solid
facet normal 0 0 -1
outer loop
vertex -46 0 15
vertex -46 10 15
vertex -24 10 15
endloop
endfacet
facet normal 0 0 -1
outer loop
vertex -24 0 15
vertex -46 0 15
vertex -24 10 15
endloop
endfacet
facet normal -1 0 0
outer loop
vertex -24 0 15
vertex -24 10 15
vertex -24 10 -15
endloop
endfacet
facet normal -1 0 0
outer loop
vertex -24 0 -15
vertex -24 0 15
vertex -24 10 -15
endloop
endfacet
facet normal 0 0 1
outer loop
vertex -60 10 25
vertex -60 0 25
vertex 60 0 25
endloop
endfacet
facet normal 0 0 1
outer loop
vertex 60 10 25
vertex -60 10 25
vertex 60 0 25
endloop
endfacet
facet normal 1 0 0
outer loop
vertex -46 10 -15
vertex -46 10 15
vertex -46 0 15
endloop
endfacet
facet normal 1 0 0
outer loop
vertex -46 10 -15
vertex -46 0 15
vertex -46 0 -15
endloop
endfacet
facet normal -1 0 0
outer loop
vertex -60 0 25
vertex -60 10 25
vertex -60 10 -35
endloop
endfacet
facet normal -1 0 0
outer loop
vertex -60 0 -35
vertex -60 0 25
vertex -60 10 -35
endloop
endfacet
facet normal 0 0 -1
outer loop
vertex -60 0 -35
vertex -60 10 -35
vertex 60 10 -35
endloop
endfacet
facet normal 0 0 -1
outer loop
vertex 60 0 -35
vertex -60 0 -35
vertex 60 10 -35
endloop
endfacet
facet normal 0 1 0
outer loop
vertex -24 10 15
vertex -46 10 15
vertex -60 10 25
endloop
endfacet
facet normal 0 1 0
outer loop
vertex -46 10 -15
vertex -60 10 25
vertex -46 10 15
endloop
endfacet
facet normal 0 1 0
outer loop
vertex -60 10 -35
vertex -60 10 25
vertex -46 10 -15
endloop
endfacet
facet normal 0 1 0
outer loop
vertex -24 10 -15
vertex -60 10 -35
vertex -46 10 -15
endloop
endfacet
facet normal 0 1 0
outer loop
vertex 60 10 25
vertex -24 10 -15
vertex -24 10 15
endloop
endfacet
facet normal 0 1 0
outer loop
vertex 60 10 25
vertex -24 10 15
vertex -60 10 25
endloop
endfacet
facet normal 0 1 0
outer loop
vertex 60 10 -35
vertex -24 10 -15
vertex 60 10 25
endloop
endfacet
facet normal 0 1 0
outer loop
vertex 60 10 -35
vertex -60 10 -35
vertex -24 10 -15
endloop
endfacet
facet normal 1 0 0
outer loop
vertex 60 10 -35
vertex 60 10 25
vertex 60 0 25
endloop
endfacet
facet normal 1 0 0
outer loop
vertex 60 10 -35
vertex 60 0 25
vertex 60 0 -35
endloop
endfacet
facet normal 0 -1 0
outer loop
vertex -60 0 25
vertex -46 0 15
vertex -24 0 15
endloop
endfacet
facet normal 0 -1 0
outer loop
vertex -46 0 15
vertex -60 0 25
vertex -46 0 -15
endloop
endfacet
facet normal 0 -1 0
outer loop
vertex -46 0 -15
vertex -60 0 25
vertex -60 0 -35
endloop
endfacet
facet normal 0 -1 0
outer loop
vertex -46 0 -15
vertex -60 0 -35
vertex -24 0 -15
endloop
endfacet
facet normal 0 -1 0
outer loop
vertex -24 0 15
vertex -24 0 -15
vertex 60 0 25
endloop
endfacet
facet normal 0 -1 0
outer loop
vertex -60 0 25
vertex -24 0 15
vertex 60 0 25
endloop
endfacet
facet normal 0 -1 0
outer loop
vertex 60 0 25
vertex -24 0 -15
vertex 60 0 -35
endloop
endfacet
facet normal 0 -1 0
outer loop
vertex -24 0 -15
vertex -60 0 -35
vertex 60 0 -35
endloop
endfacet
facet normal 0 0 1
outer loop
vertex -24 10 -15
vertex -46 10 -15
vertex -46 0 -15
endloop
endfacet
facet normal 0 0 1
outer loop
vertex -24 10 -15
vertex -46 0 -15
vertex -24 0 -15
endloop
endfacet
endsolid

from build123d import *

# Parameters (mm, degrees)
SKIZZE1_W                       = 120
SKIZZE1_H                       = 50
AUFSATZ_LINEAR_AUSTRAGEN1_DEPTH = 10
SKIZZE3_W                       = 22
SKIZZE3_H                       = 30
SCHNITT_LINEAR_AUSTRAGEN1_DEPTH = 66.76473219
SKIZZE4_W                       = 120
SKIZZE4_H                       = 10
AUFSATZ_LINEAR_AUSTRAGEN2_DEPTH = 10


with BuildPart() as part:
    # Skizze1 → Aufsatz-Linear austragen1 (new body)
    with BuildSketch(Plane(origin=(0, 0, 0), x_dir=(1, 0, 0), z_dir=(0, 1, 0))):
        Rectangle(SKIZZE1_W, SKIZZE1_H)
    extrude(amount=AUFSATZ_LINEAR_AUSTRAGEN1_DEPTH)

    # Skizze3 → Schnitt-Linear austragen1 (cut, through all)
    with BuildSketch(Plane(origin=(0, 10, 0), x_dir=(1, 0, 0), z_dir=(0, 1, 0))):
        with Locations((-35, 0)):
            Rectangle(SKIZZE3_W, SKIZZE3_H)
    extrude(amount=-SCHNITT_LINEAR_AUSTRAGEN1_DEPTH, mode=Mode.SUBTRACT)

    # Skizze4 → Aufsatz-Linear austragen2 (add)
    with BuildSketch(Plane(origin=(0, 10, 0), x_dir=(1, 0, 0), z_dir=(0, 1, 0))):
        with Locations((0, 30)):
            Rectangle(SKIZZE4_W, SKIZZE4_H)
    extrude(amount=-AUFSATZ_LINEAR_AUSTRAGEN2_DEPTH)


solid = part.part
